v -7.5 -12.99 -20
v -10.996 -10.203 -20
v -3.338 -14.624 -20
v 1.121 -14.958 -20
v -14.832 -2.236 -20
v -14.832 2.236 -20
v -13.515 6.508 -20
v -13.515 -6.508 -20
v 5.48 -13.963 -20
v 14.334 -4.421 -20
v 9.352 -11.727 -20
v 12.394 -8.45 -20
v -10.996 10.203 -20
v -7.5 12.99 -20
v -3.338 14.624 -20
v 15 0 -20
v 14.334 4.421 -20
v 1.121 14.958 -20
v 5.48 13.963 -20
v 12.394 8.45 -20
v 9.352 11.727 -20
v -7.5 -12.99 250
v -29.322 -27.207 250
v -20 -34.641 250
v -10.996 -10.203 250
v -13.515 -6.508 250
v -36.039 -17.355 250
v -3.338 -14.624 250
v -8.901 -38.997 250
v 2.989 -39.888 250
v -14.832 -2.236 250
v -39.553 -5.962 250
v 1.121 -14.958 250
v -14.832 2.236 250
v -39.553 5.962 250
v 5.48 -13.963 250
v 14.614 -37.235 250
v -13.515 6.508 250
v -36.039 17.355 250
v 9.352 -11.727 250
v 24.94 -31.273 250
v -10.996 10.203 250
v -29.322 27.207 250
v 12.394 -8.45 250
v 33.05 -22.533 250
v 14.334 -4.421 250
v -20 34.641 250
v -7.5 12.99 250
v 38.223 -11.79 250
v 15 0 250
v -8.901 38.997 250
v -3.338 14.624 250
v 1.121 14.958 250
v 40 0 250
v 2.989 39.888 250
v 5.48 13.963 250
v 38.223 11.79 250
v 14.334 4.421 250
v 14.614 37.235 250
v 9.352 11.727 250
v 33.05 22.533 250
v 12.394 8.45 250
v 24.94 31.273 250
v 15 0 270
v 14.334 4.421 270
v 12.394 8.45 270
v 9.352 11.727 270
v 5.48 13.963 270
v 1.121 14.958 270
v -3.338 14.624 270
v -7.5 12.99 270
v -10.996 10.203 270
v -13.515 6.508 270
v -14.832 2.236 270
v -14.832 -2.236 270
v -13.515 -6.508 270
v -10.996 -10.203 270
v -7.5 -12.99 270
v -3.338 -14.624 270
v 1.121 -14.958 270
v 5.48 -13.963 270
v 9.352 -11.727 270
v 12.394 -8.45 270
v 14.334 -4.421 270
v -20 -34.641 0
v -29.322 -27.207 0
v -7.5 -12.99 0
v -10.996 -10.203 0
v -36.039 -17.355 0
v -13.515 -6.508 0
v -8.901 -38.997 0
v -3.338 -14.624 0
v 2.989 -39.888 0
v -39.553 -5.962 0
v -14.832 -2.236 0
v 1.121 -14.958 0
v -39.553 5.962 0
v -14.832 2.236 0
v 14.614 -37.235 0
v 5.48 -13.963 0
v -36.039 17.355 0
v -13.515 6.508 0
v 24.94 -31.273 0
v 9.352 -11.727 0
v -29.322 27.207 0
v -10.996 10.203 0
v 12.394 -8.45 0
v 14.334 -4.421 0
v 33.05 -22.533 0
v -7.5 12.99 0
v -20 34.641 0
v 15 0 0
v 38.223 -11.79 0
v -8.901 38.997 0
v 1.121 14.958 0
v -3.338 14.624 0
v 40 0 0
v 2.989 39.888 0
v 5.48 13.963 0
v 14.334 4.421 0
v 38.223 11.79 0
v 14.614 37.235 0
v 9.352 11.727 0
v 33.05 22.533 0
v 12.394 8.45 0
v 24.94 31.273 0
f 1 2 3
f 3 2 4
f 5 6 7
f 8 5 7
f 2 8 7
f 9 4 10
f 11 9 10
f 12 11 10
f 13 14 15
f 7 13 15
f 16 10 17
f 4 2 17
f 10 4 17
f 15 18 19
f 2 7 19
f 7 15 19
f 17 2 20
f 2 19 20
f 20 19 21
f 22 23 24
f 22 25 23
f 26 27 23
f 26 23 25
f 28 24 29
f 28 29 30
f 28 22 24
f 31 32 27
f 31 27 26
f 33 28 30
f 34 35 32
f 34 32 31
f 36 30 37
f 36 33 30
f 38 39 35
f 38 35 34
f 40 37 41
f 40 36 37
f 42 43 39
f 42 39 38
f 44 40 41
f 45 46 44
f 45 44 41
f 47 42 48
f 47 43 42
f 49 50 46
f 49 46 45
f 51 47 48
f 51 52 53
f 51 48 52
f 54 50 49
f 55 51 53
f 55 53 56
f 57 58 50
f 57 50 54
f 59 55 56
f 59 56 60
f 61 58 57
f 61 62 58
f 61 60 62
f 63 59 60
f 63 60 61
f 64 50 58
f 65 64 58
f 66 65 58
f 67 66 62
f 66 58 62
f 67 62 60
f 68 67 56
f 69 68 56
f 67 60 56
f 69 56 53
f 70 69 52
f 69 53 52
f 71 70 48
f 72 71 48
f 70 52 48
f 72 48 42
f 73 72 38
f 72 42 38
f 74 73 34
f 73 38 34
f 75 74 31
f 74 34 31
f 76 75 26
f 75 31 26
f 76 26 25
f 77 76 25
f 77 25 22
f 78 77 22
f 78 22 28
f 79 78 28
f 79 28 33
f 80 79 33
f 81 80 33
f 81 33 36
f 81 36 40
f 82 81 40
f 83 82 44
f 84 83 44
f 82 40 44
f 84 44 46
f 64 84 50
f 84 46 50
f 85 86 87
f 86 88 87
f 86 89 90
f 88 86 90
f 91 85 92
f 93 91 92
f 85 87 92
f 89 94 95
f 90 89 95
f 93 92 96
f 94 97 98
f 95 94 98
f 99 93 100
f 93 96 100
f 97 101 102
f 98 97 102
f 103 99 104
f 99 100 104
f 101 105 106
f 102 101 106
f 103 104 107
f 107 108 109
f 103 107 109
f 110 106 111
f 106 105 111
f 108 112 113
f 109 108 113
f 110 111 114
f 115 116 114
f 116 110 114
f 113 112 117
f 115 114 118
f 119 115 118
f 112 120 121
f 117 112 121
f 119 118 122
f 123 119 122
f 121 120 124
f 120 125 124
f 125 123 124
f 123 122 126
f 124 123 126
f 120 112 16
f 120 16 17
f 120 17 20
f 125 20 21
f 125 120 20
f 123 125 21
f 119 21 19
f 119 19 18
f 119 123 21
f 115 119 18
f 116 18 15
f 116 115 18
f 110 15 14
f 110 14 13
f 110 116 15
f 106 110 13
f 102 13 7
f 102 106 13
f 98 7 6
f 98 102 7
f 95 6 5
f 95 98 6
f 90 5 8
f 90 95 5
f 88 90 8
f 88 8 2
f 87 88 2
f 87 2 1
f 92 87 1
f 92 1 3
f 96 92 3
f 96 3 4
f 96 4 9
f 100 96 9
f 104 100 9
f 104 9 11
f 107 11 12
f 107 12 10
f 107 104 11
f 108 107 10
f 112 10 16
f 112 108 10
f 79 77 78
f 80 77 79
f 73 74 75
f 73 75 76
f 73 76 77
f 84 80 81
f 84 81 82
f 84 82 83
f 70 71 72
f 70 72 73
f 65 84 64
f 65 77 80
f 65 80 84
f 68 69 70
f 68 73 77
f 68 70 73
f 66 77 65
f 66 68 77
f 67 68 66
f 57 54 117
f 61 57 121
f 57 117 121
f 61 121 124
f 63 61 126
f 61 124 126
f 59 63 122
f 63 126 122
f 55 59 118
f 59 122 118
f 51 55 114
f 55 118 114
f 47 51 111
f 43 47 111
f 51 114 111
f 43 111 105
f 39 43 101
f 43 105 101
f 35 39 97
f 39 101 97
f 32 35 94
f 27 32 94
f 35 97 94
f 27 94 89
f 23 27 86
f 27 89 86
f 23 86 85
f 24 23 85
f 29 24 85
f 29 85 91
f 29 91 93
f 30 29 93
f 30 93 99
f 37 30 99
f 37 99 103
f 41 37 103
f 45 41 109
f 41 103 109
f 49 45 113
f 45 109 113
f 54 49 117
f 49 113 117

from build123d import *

# Parameters (mm, degrees)
SKETCH1_R           = 40
BOSS_EXTRUDE1_DEPTH = 250
SKETCH2_R           = 15
BOSS_EXTRUDE2_DEPTH = 20


with BuildPart() as part:
    # Sketch1 → Boss-Extrude1 (new body)
    with BuildSketch(Plane.XY):
        Circle(SKETCH1_R)
    extrude(amount=BOSS_EXTRUDE1_DEPTH)

    # Sketch2 → Boss-Extrude2 (add)
    with BuildSketch(Plane.XY.offset(250)):
        Circle(SKETCH2_R)
    boss_extrude2 = extrude(amount=BOSS_EXTRUDE2_DEPTH)

    # Mirror1: Boss-Extrude2 across plane
    add(boss_extrude2.mirror(Plane.XY.offset(125)))


solid = part.part
